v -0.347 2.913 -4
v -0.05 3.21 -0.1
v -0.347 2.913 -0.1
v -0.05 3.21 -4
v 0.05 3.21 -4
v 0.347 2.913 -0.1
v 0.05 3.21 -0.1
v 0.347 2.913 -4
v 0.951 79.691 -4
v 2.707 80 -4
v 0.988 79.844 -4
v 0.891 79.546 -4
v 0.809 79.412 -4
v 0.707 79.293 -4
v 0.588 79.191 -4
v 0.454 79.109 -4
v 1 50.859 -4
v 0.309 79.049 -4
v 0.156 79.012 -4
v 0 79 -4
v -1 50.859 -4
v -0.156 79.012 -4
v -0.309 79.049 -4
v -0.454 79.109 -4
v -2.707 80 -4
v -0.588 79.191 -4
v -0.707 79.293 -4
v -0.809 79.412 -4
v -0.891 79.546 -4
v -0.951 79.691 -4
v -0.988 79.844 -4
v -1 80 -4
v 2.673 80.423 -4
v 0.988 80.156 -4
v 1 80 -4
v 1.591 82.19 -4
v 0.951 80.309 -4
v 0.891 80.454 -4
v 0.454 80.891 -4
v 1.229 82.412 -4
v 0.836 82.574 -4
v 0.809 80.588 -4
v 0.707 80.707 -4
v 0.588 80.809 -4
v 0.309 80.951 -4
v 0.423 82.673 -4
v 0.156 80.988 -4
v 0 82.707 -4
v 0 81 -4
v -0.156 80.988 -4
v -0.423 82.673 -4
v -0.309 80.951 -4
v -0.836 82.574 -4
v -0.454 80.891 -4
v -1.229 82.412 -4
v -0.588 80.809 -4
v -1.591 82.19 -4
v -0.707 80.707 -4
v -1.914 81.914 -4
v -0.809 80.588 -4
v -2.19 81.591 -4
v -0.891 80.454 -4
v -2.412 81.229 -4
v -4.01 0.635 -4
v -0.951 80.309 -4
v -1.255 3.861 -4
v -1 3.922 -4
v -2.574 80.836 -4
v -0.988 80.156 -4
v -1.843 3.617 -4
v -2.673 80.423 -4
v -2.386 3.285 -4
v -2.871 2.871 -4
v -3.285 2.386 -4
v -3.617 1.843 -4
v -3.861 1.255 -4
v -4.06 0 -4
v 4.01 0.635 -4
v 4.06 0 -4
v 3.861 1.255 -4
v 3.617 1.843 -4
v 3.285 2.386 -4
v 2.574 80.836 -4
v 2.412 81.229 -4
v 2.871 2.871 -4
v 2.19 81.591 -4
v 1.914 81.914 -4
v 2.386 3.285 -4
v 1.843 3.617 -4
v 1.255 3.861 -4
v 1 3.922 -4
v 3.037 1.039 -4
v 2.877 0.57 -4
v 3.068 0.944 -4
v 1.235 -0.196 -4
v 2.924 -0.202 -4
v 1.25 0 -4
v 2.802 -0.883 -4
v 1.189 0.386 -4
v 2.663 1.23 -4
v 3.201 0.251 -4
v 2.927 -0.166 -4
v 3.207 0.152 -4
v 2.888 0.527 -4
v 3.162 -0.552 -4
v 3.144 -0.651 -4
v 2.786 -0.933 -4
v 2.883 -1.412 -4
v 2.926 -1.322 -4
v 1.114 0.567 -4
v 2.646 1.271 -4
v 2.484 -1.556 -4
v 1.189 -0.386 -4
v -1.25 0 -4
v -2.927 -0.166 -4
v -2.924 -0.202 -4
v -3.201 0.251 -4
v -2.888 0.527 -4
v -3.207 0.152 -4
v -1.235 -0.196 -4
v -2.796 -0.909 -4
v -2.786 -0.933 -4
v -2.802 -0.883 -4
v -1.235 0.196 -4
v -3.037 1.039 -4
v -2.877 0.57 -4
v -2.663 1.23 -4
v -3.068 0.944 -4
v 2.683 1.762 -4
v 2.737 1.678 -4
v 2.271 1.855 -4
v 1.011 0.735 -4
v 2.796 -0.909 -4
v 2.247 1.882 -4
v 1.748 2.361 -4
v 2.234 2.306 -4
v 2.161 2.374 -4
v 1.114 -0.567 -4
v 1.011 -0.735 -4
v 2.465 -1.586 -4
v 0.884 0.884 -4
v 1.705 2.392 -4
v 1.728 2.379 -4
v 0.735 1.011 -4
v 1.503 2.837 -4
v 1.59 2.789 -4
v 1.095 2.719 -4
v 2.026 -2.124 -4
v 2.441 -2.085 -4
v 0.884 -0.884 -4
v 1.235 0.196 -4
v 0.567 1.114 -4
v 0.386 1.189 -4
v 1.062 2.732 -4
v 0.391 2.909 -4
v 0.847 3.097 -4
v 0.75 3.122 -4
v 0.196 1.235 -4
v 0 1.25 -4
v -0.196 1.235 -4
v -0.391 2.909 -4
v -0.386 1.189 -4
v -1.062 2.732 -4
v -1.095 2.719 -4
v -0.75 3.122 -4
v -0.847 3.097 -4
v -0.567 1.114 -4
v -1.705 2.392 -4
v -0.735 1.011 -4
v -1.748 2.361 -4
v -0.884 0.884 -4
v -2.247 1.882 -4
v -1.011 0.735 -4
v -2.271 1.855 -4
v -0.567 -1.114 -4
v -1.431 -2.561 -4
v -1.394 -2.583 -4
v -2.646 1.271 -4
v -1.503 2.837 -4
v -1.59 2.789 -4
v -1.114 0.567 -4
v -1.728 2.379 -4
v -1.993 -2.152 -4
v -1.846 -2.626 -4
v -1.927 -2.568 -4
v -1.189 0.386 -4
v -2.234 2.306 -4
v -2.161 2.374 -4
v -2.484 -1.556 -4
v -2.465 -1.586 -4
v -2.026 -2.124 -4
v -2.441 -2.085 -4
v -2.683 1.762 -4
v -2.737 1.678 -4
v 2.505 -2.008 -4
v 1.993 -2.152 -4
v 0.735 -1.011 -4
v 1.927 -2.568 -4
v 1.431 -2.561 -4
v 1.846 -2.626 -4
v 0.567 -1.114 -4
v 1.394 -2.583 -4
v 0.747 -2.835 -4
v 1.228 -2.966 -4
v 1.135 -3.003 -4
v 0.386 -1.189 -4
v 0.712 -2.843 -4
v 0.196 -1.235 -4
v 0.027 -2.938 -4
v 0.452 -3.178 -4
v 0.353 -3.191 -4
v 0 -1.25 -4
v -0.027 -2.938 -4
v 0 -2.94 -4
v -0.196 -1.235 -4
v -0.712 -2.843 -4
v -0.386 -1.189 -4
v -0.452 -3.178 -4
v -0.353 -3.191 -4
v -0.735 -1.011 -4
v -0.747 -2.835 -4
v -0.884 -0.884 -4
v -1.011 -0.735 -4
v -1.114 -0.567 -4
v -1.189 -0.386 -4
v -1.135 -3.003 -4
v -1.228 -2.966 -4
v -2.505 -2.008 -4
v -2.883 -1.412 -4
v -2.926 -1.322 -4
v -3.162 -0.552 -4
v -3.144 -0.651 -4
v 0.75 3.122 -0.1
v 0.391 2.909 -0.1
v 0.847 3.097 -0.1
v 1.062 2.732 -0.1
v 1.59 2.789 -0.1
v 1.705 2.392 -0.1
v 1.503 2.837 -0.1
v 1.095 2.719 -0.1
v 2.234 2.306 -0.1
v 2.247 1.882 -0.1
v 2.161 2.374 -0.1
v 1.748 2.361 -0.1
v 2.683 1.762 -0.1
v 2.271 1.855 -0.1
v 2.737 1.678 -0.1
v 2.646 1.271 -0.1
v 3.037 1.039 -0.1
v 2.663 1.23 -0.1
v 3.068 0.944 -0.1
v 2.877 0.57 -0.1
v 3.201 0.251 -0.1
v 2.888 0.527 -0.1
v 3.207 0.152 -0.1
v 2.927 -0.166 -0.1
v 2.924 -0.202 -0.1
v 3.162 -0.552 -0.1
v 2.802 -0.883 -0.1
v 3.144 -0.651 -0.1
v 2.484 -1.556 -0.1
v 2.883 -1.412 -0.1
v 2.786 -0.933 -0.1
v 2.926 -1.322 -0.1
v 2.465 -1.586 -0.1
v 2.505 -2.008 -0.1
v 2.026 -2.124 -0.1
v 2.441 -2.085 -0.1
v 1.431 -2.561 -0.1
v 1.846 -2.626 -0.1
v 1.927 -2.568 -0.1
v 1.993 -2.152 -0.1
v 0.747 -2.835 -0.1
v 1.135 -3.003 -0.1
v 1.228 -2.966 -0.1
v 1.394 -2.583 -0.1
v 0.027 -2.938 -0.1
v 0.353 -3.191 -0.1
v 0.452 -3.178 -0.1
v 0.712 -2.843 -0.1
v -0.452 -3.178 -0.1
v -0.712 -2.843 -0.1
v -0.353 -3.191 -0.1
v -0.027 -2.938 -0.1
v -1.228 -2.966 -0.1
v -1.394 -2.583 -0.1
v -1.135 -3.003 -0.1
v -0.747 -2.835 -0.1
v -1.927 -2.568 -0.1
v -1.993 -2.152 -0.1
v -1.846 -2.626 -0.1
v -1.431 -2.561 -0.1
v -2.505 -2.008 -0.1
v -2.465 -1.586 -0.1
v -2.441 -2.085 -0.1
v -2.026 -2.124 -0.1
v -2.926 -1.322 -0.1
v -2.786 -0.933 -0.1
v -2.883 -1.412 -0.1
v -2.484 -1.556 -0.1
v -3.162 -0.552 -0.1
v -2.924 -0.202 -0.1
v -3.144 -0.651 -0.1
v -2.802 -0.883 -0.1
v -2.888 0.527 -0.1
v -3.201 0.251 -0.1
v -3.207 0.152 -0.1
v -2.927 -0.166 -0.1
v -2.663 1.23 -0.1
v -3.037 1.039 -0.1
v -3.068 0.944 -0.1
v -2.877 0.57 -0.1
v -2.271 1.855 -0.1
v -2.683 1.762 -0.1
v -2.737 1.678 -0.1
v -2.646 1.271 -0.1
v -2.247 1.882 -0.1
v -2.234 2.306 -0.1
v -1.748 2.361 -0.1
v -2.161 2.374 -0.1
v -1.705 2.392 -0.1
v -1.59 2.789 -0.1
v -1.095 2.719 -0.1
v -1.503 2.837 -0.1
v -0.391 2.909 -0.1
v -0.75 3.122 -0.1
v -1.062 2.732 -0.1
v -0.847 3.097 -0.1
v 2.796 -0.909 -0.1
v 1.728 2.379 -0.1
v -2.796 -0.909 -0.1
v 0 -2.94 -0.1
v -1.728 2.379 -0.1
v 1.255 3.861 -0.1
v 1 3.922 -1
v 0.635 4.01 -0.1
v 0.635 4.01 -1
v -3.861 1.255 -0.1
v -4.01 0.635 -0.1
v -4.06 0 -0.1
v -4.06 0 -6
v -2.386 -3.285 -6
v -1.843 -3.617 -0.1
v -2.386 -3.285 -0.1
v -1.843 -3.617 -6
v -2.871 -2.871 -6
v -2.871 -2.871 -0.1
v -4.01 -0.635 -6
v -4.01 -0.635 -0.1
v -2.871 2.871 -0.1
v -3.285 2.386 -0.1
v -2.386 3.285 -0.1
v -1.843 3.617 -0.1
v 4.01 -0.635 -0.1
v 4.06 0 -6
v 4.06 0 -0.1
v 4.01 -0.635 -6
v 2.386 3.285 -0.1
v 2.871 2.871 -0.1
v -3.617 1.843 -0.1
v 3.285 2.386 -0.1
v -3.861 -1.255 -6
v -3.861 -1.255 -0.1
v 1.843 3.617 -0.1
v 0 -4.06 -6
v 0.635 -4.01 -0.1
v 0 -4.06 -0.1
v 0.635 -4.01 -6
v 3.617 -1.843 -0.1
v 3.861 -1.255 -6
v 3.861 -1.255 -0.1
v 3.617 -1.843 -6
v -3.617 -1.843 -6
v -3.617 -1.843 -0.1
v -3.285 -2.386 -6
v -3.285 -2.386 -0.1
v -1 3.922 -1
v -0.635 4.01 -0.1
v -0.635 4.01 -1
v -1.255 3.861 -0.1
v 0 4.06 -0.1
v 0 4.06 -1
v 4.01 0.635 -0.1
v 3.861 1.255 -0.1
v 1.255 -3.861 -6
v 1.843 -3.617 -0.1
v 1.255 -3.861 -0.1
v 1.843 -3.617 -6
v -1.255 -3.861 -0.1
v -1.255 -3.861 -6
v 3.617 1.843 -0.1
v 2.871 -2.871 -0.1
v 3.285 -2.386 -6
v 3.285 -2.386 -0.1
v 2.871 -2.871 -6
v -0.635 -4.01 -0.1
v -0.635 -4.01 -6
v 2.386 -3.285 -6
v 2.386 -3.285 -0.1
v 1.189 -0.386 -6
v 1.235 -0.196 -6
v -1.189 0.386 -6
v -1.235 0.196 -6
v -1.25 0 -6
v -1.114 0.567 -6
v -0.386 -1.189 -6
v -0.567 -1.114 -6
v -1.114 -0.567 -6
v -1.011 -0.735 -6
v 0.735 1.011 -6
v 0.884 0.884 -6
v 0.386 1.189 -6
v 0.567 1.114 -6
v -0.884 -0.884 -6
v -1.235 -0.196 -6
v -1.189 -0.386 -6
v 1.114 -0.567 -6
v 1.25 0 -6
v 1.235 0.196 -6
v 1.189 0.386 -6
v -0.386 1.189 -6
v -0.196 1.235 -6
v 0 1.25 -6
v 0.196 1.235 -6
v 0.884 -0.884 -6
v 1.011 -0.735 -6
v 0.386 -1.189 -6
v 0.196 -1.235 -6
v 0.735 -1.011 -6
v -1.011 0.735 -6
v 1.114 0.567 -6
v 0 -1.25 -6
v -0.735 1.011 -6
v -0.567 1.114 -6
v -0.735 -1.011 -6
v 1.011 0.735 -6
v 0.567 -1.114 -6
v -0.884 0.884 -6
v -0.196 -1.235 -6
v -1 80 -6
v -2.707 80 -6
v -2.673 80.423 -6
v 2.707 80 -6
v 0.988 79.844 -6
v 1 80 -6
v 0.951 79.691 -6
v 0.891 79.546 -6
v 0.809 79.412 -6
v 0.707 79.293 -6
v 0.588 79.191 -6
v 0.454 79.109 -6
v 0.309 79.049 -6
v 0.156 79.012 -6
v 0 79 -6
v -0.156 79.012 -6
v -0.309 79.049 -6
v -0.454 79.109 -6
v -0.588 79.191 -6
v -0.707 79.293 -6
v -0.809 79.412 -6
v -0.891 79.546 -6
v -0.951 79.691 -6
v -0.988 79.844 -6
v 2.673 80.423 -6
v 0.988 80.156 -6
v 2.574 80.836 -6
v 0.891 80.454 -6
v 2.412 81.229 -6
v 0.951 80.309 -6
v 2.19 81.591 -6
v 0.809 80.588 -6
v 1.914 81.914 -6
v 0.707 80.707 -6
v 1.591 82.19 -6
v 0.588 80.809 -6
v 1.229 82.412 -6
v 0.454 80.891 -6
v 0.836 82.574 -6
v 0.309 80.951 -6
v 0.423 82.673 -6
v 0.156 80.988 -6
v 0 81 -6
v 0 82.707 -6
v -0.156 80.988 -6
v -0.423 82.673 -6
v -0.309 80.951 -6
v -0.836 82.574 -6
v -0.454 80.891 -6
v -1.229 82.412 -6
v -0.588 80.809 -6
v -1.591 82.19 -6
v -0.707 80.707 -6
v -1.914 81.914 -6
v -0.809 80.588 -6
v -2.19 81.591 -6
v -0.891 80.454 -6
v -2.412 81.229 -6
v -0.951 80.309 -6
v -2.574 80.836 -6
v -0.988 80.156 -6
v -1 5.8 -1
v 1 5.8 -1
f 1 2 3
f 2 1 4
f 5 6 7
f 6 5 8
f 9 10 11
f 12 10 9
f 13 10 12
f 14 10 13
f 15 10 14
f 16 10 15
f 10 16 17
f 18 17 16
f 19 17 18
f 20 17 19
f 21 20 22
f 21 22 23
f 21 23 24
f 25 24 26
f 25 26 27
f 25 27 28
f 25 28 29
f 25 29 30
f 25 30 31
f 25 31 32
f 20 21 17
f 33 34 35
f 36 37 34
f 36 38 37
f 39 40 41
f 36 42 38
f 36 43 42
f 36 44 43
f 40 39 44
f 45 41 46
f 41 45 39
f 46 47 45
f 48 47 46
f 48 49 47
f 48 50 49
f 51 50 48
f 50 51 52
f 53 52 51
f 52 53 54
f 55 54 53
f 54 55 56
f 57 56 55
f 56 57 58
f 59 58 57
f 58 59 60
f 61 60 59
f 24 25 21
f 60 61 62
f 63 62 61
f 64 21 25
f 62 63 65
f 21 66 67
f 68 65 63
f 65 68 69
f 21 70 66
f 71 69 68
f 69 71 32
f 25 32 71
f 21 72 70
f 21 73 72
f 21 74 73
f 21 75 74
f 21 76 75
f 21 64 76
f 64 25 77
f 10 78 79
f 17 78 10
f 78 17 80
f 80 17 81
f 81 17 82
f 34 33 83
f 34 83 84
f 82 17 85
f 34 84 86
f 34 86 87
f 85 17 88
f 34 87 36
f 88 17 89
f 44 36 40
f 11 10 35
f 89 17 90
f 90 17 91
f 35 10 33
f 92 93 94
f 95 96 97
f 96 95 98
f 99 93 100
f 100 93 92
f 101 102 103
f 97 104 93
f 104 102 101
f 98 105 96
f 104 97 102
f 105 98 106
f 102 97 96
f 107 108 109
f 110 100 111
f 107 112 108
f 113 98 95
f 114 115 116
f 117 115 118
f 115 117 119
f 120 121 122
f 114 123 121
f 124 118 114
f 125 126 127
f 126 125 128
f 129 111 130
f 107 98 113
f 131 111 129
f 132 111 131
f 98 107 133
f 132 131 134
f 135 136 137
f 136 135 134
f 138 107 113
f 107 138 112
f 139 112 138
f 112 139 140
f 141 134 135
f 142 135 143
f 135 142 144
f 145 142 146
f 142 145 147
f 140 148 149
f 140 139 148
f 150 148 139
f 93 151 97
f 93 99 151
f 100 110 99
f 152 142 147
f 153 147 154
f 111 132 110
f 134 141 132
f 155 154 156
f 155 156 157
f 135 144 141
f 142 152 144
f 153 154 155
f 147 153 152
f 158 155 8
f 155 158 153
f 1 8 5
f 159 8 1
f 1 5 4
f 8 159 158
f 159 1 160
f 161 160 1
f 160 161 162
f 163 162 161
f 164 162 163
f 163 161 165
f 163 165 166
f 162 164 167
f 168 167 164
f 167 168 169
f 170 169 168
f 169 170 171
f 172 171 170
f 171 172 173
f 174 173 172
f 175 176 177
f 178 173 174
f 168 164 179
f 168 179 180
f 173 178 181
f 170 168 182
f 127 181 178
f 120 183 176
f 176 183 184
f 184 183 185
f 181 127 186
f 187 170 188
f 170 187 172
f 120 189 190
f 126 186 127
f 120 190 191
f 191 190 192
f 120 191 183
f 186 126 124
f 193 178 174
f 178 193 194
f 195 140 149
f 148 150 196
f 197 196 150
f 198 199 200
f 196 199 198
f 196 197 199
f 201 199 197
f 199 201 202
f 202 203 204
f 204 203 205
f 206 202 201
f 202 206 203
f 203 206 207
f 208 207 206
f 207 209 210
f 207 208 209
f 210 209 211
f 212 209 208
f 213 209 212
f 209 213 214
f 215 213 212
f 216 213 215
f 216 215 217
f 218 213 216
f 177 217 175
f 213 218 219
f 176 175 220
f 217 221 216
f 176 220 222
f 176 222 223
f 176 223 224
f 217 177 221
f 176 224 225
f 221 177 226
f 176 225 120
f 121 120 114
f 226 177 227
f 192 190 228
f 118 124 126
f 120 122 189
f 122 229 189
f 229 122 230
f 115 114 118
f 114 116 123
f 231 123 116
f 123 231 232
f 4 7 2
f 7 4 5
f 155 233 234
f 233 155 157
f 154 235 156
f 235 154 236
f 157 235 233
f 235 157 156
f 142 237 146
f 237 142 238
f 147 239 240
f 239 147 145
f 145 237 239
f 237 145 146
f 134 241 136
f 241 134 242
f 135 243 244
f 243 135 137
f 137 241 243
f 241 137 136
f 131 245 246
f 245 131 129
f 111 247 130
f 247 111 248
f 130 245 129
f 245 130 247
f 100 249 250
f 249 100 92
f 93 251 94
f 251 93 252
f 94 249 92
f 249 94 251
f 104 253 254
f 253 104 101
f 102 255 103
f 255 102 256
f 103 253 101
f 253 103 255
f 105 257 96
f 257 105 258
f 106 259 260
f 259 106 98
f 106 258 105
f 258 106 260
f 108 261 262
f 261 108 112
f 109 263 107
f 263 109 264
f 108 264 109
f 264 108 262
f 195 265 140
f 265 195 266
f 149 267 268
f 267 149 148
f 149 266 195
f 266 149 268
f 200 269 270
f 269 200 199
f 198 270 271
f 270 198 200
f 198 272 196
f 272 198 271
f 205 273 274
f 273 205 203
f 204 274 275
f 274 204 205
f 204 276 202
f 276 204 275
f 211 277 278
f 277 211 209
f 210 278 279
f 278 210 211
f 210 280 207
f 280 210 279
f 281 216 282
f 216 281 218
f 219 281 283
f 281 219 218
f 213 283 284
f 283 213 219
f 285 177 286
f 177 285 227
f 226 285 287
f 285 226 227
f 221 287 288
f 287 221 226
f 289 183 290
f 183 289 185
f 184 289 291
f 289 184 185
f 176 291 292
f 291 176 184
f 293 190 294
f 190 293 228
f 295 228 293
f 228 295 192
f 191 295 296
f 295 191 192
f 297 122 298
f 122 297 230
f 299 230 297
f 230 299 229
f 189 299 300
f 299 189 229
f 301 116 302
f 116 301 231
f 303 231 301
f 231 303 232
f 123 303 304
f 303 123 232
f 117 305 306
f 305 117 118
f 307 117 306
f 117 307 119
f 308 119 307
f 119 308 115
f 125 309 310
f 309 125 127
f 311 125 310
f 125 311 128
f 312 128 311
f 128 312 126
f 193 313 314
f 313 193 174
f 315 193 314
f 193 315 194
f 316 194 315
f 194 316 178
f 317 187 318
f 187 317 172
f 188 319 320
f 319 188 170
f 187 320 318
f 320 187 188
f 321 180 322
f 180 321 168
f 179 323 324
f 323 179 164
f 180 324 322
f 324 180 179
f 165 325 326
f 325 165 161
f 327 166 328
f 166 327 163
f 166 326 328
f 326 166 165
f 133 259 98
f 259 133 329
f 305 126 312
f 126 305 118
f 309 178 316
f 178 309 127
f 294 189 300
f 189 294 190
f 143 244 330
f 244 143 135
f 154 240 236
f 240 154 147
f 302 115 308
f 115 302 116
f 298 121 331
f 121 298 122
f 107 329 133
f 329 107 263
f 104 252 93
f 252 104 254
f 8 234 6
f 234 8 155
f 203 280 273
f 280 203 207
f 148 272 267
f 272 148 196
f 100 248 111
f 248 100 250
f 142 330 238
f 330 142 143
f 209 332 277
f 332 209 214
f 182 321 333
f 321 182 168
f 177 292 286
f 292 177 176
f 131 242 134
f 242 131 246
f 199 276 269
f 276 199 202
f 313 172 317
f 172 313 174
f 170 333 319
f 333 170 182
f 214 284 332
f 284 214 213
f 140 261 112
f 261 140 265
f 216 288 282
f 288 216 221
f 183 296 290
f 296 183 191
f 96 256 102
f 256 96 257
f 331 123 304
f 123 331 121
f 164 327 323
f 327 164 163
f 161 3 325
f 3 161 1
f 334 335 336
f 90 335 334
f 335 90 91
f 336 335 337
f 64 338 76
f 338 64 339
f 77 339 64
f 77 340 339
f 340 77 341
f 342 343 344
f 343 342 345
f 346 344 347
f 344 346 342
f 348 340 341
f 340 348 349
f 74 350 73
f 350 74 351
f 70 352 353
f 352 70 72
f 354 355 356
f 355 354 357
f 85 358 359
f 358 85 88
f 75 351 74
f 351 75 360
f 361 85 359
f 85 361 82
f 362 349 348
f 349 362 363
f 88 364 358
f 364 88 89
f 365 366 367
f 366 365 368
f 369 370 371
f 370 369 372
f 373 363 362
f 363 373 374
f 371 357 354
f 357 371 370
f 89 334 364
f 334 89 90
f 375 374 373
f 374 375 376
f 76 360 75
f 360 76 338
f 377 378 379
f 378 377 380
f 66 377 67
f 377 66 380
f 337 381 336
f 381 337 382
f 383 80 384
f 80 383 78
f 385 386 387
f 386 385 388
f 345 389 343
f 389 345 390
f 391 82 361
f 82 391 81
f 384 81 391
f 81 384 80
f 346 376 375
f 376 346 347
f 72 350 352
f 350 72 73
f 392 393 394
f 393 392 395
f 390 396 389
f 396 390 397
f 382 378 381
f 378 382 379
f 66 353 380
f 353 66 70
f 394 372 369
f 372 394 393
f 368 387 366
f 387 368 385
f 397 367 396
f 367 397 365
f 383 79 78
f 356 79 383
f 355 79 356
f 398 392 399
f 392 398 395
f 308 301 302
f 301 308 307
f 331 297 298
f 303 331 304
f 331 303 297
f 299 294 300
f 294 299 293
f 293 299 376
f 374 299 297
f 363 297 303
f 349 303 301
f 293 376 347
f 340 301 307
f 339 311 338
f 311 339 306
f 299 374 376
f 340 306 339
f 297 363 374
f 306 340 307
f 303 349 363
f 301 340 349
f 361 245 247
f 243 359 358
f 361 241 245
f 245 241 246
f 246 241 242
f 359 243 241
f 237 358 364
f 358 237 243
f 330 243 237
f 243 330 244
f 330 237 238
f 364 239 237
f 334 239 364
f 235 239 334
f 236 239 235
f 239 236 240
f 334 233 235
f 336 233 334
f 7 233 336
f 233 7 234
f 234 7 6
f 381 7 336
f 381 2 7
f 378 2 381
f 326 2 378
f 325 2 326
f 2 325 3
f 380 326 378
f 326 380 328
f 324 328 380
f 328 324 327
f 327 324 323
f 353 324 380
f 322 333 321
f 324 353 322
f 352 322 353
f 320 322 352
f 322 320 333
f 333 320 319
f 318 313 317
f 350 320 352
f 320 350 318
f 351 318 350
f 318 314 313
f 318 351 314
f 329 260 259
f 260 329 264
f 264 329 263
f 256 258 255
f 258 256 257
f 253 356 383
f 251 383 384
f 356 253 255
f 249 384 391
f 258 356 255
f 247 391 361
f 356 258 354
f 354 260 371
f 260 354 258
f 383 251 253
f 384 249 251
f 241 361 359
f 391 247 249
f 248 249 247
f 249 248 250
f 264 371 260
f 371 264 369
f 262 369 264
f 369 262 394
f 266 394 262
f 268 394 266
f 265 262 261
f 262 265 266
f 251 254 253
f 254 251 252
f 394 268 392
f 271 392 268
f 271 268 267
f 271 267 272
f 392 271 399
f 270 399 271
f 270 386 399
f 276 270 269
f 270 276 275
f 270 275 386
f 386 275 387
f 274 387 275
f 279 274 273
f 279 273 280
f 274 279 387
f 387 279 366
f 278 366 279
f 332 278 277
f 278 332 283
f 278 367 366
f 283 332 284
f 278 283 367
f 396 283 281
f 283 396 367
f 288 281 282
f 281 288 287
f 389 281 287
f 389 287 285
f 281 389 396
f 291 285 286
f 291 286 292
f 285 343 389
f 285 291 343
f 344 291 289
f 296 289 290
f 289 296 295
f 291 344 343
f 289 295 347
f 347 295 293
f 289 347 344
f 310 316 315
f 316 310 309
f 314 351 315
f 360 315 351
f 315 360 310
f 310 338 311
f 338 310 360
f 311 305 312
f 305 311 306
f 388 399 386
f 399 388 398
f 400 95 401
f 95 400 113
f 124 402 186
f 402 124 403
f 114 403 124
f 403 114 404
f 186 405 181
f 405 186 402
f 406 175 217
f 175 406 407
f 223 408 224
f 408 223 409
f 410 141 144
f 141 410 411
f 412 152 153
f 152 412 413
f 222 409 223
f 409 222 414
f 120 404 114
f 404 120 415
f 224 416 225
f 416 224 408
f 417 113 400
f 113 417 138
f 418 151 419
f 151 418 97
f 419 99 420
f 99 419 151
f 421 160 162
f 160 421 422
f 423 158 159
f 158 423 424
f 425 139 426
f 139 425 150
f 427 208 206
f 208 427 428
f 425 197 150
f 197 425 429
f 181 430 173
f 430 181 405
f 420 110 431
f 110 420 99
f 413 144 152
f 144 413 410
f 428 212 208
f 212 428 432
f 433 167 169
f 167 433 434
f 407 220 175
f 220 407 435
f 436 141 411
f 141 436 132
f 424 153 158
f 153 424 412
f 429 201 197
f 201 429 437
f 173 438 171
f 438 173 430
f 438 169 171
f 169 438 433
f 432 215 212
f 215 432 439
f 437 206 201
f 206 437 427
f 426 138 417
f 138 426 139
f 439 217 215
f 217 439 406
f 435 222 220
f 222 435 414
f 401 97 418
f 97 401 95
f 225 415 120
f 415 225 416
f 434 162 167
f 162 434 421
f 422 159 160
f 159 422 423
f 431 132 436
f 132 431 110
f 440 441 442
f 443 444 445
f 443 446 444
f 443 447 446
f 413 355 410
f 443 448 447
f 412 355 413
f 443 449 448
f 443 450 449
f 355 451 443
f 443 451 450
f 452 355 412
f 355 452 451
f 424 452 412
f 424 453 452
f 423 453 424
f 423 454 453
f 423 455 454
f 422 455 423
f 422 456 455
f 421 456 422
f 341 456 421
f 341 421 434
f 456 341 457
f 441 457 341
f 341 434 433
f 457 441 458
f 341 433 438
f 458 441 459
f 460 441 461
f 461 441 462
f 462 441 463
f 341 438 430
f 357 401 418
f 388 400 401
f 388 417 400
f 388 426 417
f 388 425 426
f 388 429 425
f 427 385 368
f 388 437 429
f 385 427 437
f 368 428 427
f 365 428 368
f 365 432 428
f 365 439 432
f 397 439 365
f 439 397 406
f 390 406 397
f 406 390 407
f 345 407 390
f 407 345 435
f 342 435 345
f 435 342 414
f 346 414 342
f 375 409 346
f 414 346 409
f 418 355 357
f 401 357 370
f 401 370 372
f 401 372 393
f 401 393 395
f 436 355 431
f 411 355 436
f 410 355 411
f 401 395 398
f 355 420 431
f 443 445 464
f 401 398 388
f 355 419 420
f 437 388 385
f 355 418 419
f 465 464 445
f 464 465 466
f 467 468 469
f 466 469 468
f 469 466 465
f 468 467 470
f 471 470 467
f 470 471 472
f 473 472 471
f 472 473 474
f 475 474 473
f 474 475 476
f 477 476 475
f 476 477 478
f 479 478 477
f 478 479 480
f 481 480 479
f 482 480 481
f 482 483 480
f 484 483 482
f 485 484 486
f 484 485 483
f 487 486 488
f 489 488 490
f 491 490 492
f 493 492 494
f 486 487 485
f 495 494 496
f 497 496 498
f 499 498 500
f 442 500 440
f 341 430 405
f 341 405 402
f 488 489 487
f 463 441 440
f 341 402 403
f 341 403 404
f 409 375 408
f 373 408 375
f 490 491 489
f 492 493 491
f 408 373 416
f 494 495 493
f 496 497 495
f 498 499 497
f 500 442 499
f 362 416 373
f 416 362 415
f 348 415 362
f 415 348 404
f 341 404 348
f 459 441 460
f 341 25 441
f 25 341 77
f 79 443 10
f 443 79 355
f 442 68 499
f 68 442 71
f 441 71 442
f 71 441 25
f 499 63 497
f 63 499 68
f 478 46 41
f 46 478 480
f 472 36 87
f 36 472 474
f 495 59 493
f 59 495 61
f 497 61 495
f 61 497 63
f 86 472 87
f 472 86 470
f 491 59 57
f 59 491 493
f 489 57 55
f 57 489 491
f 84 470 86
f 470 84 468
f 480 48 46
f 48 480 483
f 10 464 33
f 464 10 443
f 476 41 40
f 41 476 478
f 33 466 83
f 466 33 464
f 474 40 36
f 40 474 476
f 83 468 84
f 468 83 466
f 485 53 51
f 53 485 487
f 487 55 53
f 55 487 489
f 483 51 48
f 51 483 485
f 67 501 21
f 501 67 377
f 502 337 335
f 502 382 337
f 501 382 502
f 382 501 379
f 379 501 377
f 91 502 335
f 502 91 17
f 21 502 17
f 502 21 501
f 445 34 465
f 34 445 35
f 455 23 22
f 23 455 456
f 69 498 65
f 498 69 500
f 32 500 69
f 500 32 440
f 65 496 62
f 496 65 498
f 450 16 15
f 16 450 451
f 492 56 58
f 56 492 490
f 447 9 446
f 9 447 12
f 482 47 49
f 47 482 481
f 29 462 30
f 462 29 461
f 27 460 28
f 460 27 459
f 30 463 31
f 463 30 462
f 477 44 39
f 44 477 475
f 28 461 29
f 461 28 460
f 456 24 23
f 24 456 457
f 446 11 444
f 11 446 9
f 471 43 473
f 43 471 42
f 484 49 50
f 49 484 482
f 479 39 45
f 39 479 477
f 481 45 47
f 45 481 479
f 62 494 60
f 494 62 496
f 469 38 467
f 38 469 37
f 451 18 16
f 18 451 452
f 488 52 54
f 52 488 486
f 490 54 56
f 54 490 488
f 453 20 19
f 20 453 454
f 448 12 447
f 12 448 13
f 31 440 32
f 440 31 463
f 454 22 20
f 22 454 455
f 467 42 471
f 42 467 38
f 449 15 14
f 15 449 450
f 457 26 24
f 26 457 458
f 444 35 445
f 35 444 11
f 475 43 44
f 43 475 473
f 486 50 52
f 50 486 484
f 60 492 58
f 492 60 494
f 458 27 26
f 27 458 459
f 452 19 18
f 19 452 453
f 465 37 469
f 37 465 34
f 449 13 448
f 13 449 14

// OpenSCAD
/**
 *  Parametric servo arm generator for OpenScad
 *  Générateur de palonnier de servo pour OpenScad
 *
 *  Copyright (c) 2012 Charles Rincheval.  All rights reserved.
 *
 *  This library is free software; you can redistribute it and/or
 *  modify it under the terms of the GNU Lesser General Public
 *  License as published by the Free Software Foundation; either
 *  version 2.1 of the License, or (at your option) any later version.
 *
 *  This library is distributed in the hope that it will be useful,
 *  but WITHOUT ANY WARRANTY; without even the implied warranty of
 *  MERCHANTABILITY or FITNESS FOR A PARTICULAR PURPOSE.  See the GNU
 *  Lesser General Public License for more details.
 *
 *  You should have received a copy of the GNU Lesser General Public
 *  License along with this library; if not, write to the Free Software
 *  Foundation, Inc., 51 Franklin St, Fifth Floor, Boston, MA  02110-1301  USA
 *
 *  Last update :
 *  https://github.com/hugokernel/OpenSCAD_ServoArms
 *
 *  http://www.digitalspirit.org/
 */

arm_length = 80;

arm_count = 1; // [1,2,3,4,5,6,7,8]

//  Clear between arm head and servo head (PLA: 0.3, ABS 0.2)
SERVO_HEAD_CLEAR = 0.25; // [0.2,0.3,0.4,0.5]

$fn = 40 / 1;

/**
 *  Head / Tooth parameters
 *  Futaba 3F Standard Spline
 *  http://www.servocity.com/html/futaba_servo_splines.html
 *
 *  First array (head related) :
 *  0. Head external diameter
 *  1. Head heigth
 *  2. Head thickness
 *  3. Head screw diameter
 *
 *  Second array (tooth related) :
 *  0. Tooth count
 *  1. Tooth height
 *  2. Tooth length
 *  3. Tooth width
 */
FUTABA_3F_SPLINE = [
    [5.92, 4, 1.1, 2.5],
    [25, 0.3, 0.7, 0.1]
];

module servo_futaba_3f(length, count) {
    servo_arm(FUTABA_3F_SPLINE, [length, count]);
}

/**
 *  If you want to support a new servo, juste add a new spline definition array
 *  and a module named like servo_XXX_YYY where XXX is servo brand and YYY is the
 *  connection type (3f) or the servo type (s3003)
 */

module servo_standard(length, count) {
    servo_futaba_3f(length, count);
}

/**
 *  Tooth
 *
 *    |<-w->|
 *    |_____|___
 *    /     \  ^h
 *  _/       \_v
 *   |<--l-->|
 *
 *  - tooth length (l)
 *  - tooth width (w)
 *  - tooth height (h)
 *  - height
 *
 */
module servo_head_tooth(length, width, height, head_height) {
    linear_extrude(height = head_height) {
        polygon([[-length / 2, 0], [-width / 2, height], [width / 2, height], [length / 2,0]]);
    }
}

/**
 *  Servo head
 */
module servo_head(params, clear = SERVO_HEAD_CLEAR) {

    head = params[0];
    tooth = params[1];

    head_diameter = head[0];
    head_heigth = head[1];

    tooth_count = tooth[0];
    tooth_height = tooth[1];
    tooth_length = tooth[2];
    tooth_width = tooth[3];

    % cylinder(r = head_diameter / 2, h = head_heigth + 1);

    cylinder(r = head_diameter / 2 - tooth_height + 0.03 + clear, h = head_heigth);

    for (i = [0 : tooth_count]) {
        rotate([0, 0, i * (360 / tooth_count)]) {
            translate([0, head_diameter / 2 - tooth_height + clear, 0]) {
                servo_head_tooth(tooth_length, tooth_width, tooth_height, head_heigth);
            }
        }
    }
}

/**
 *  Servo hold
 *  - Head / Tooth parameters
 *  - Arms params (length and count)
 */
module servo_arm(params, arms) {

    head = params[0];
    tooth = params[1];

    head_diameter = head[0];
    head_heigth = head[1];
    head_thickness = head[2];
    head_screw_diameter = head[3];

    tooth_length = tooth[2];
    tooth_width = tooth[3];

    arm_length = arms[0];
    arm_count = arms[1];

    /**
     *  Servo arm
     *  - length is from center to last hole
     */
    module arm(tooth_length, tooth_width, head_height, head_heigth, hole_count = 1) {

        arm_screw_diameter = 2;

        difference() {
            union() {
                cylinder(r = tooth_width / 2, h = head_heigth);

                linear_extrude(height = head_heigth) {
                    polygon([
                        [-tooth_width / 2, 0], [-tooth_width / 3, tooth_length],
                        [tooth_width / 3, tooth_length], [tooth_width / 2, 0]
                    ]);
                }

                translate([0, tooth_length, 0]) {
                    cylinder(r = tooth_width / 3, h = head_heigth);
                }

                if (tooth_length >= 12) {
                    translate([-head_heigth / 2 + 2, 3.8, -4]) {
                        rotate([90, 0, 0]) {
                            rotate([0, -90, 0]) {
                                linear_extrude(height = head_heigth) {
                                    polygon([
                                        [-tooth_length / 1.7, 4], [0, 4], [0, - head_height + 5],
                                        [-2, - head_height + 5]
                                    ]);
                                }
                            }
                        }
                    }
                }
            }

            // Hole
            for (i = [0 : hole_count - 1]) {
                //translate([0, length - (length / hole_count * i), -1]) {
                translate([0, tooth_length - (4 * i), -1]) {
                    cylinder(r = arm_screw_diameter / 2, h = 10);
                }
            }

            cylinder(r = head_screw_diameter / 2, h = 10);
        }
    }

    difference() {
        translate([0, 0, 0.1]) {
            cylinder(r = head_diameter / 2 + head_thickness, h = head_heigth + 1);
        }

        cylinder(r = head_screw_diameter / 2, h = 10);

        servo_head(params);
    }

    arm_thickness = head_thickness;

    // Arm
    translate([0, 0, head_heigth]) {
        for (i = [0 : arm_count - 1]) {
            rotate([0, 0, i * (360 / arm_count)]) {
                arm(arm_length, head_diameter + arm_thickness * 2, head_heigth, 2);
            }
        }
    }
}

module demo() {
    rotate([0, 180, 0])
        servo_standard(arm_length, arm_count);
}

demo();
